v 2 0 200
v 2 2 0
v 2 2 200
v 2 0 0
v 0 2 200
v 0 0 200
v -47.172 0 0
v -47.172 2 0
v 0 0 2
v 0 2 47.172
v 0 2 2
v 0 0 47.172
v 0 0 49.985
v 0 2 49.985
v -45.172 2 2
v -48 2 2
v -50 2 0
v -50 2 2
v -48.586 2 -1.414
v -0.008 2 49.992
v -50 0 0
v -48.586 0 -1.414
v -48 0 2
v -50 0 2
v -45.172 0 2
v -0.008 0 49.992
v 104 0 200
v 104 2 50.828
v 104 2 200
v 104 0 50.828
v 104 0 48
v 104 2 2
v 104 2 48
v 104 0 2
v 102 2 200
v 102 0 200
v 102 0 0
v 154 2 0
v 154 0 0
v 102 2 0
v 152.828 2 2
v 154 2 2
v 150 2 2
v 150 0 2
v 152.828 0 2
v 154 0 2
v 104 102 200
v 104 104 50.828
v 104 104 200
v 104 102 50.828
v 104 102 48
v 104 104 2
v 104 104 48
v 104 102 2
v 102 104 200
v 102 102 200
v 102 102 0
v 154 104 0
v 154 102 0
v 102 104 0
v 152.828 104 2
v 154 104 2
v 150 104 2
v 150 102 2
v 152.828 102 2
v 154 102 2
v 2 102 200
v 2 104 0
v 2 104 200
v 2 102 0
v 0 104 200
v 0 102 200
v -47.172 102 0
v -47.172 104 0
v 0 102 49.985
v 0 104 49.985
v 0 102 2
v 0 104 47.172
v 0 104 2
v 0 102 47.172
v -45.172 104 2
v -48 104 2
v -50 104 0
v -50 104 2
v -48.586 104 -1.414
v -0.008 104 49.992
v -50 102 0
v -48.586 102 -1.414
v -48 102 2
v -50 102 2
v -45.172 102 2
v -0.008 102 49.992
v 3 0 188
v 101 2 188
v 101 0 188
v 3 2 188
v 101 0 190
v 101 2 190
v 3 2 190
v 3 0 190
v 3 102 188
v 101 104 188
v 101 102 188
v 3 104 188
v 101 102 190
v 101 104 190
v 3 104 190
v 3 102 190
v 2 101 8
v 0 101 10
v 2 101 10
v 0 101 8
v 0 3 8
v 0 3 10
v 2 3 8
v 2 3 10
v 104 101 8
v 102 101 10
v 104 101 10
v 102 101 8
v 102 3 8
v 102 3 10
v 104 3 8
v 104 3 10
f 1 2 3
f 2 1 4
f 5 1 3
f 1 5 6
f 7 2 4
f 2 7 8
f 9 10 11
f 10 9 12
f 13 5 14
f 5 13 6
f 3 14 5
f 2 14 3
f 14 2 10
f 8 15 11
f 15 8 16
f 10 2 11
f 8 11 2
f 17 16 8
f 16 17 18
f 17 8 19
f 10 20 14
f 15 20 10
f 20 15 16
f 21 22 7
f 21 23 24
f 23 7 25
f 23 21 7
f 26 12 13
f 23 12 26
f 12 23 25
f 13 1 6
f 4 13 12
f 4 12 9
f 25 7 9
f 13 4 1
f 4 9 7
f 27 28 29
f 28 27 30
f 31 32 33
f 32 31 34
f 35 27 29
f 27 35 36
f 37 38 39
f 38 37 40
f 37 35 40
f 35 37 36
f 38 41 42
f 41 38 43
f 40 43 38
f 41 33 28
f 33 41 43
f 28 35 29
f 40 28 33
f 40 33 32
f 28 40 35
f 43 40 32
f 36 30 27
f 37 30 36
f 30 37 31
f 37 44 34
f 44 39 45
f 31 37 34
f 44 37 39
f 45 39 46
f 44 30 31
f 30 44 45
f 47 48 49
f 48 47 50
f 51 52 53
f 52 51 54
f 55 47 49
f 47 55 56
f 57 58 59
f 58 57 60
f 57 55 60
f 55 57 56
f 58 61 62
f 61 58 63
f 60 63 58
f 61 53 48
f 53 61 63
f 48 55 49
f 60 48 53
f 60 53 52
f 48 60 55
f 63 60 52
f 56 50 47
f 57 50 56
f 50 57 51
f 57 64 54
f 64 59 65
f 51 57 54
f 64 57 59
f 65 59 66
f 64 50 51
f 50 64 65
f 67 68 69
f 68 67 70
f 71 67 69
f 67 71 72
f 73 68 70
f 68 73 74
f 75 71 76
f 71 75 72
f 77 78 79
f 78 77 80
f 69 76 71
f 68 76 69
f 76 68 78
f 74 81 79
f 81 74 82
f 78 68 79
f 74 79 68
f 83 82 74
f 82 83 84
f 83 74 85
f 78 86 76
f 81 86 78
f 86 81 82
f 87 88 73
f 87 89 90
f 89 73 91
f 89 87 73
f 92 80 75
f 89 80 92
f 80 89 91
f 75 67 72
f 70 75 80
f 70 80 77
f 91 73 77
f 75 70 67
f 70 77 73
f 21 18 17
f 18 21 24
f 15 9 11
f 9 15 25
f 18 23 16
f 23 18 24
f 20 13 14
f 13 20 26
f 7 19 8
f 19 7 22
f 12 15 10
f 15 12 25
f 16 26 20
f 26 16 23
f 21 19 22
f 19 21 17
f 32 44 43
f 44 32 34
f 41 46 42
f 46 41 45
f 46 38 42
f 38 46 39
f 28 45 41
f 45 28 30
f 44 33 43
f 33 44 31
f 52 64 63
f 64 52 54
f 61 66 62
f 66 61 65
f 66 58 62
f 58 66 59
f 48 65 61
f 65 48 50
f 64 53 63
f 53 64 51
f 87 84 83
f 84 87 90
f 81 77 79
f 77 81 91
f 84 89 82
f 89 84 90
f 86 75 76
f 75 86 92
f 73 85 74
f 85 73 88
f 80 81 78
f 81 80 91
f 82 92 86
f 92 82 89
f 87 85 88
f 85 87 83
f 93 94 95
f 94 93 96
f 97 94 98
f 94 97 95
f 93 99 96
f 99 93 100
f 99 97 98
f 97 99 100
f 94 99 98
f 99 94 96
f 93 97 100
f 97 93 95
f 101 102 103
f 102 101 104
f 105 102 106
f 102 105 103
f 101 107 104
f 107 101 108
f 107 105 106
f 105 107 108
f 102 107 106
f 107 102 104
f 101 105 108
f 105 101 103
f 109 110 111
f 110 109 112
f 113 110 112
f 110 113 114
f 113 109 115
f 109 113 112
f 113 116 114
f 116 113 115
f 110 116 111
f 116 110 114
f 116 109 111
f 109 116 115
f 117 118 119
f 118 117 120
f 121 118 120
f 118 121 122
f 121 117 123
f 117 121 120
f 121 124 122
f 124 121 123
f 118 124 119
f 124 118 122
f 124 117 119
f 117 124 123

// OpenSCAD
/*
al      =   aluminum    鋁(鋁擠)
sideL   =   side length 邊長
scanner =   上下移動之消毒桿
*/
al_sideL=2; //鋁擠邊長
side_rollerR=1; //軌道輪直徑
scanner_upper=190; //scanner移動上限
scanner_lowper=10; //scanner移動下限
space_sideL=100;//中央空間邊長
l=al_sideL+space_sideL; //四根主軸定位點

module al(x,y,z,length){
    translate([x,y,z])
    color("Silver")    
    cube([al_sideL,al_sideL,length]);
}
//支架
al(0,0,0,200);//Front L
al(l,0,0,200);//Front R
al(l,l,0,200);//Rear R
al(0,l,0,200);//Rear L
    //Front L triangle
translate([-50,0,al_sideL]) rotate([0,90,0]) color("Silver")  cube([al_sideL,al_sideL,50]);
translate([-50,0,0]) rotate([0,45,0]) color("Silver")  cube([al_sideL,al_sideL,70.7]);
    //Front R triangle
translate([154,0,0]) rotate([0,-90,0]) color("Silver")  cube([al_sideL,al_sideL,50]);
translate([152,0,0]) rotate([0,-45,0]) color("Silver")  cube([al_sideL,al_sideL,70.7]);
    //Rear R triangle
translate([154,102,0]) rotate([0,-90,0]) color("Silver")  cube([al_sideL,al_sideL,50]);
translate([152,102,0]) rotate([0,-45,0]) color("Silver")  cube([al_sideL,al_sideL,70.7]);
    //Rear L triangle
translate([-50,102,al_sideL]) rotate([0,90,0]) color("Silver")  cube([al_sideL,al_sideL,50]);
translate([-50,102,0]) rotate([0,45,0]) color("Silver")  cube([al_sideL,al_sideL,70.7]);

//Scanner
translate([al_sideL + side_rollerR,0,scanner_upper]) //Front scan
    rotate([0,90,0]) cube([al_sideL,al_sideL,space_sideL-2*side_rollerR]);
translate([al_sideL + side_rollerR,l,scanner_upper]) //Rear scan
    rotate([0,90,0]) cube([al_sideL,al_sideL,space_sideL-2*side_rollerR]);
translate([0,al_sideL + side_rollerR,scanner_lowper]) //L scan
    rotate([-90,0,0]) cube([al_sideL,al_sideL,space_sideL-2*side_rollerR]);
translate([102,al_sideL + side_rollerR,scanner_lowper]) //R scan
    rotate([-90,0,0]) cube([al_sideL,al_sideL,space_sideL-2*side_rollerR]);
